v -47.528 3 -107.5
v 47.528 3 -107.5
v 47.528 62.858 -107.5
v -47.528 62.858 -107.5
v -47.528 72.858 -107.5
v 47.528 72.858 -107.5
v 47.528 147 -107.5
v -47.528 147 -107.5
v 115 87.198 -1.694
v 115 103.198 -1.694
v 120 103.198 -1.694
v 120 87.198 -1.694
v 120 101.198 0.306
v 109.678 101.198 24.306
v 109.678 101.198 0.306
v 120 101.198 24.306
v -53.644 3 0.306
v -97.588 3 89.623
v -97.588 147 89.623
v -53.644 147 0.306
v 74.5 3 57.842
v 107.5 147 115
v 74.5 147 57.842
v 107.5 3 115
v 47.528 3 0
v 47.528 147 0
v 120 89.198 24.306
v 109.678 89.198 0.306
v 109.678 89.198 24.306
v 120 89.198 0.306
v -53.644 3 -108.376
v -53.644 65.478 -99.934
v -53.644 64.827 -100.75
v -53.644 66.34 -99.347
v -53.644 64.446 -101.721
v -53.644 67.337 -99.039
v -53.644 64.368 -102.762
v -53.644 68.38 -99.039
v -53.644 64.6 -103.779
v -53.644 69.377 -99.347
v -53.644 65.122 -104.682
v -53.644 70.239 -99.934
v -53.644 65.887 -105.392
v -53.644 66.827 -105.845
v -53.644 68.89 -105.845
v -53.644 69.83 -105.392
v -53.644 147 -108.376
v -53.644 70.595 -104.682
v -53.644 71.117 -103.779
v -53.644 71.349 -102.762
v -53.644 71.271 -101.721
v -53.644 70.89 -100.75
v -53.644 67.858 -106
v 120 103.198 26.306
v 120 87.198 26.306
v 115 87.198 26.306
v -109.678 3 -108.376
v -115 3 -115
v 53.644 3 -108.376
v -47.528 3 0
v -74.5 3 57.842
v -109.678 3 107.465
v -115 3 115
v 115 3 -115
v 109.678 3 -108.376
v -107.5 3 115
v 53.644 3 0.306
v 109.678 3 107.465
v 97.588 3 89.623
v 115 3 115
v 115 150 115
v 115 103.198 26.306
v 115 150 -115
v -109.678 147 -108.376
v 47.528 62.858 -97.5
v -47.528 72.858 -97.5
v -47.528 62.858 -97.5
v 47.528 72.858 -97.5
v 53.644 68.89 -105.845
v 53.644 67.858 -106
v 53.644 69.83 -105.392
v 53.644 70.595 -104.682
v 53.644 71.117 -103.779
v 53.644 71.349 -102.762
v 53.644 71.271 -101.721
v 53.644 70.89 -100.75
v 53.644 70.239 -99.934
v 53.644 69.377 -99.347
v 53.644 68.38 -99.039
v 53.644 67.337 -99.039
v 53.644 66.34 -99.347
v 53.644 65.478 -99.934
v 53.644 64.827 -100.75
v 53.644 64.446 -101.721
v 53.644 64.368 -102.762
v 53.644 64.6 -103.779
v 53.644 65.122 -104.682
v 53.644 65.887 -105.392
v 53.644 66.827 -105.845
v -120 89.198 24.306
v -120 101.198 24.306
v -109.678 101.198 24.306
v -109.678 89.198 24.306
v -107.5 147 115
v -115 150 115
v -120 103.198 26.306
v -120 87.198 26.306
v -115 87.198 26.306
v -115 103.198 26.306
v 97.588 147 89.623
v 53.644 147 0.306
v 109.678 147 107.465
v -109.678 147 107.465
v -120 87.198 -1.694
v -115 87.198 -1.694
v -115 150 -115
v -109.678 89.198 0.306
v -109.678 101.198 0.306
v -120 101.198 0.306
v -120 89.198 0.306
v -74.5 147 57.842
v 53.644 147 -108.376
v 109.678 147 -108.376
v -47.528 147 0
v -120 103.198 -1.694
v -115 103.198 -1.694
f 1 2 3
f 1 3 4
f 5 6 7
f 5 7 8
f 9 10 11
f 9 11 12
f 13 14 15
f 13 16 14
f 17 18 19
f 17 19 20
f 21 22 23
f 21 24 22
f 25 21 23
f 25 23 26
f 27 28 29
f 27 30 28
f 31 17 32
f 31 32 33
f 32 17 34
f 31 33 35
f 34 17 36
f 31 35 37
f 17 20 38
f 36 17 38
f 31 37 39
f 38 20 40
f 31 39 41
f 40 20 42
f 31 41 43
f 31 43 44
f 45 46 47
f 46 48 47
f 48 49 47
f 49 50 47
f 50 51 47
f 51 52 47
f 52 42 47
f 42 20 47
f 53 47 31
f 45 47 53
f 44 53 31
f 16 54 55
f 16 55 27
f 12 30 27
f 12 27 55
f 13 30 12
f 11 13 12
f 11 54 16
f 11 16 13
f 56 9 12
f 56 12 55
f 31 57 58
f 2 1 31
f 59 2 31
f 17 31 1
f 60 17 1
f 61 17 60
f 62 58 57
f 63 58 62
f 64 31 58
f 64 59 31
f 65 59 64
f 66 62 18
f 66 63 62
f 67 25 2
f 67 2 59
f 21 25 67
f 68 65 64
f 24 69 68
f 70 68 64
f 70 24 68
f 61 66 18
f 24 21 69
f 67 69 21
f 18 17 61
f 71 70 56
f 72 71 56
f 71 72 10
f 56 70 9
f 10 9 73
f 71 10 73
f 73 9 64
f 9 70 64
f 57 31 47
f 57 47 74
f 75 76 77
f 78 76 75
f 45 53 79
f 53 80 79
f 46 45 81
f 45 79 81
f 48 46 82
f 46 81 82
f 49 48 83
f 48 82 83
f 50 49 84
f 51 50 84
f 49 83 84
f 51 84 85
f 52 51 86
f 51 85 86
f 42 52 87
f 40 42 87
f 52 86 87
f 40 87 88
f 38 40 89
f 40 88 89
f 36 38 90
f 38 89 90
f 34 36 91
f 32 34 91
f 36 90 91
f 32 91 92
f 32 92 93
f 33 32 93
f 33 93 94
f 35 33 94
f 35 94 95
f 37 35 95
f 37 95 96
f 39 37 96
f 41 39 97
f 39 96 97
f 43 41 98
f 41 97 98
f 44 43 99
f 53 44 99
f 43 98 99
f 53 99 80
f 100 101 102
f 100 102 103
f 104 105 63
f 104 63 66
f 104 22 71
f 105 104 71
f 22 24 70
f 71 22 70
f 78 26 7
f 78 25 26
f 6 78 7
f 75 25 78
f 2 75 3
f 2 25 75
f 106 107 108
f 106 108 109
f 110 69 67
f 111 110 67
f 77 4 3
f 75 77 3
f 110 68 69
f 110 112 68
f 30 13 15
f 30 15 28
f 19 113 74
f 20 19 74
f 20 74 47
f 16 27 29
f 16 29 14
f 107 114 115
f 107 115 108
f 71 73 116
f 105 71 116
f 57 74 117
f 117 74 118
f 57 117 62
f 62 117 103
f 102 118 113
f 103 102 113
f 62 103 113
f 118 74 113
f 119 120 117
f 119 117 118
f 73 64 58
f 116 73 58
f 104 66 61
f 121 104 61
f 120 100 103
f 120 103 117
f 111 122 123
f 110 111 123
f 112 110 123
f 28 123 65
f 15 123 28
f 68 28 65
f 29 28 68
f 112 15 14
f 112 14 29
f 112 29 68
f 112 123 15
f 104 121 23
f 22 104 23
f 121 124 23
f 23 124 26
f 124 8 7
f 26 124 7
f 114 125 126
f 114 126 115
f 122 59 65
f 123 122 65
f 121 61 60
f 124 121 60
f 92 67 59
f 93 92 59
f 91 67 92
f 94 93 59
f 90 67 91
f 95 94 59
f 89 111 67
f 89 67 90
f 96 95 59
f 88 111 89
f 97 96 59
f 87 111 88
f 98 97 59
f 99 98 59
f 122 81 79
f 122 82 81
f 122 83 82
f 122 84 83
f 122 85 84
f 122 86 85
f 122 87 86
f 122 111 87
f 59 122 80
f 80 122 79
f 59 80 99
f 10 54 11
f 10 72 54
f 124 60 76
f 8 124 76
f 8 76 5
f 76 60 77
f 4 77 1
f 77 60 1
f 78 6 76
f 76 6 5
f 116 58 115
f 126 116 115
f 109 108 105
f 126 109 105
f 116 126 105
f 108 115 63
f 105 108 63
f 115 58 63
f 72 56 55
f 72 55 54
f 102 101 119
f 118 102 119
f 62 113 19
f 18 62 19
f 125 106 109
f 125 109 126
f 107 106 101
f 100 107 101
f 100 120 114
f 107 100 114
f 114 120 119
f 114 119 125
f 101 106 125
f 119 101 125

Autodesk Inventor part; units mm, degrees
ref_plane "YZ Plane" through (0, 0, 0) normal (1, 0, 0) x (0, 1, 0)
ref_plane "XZ Plane" through (0, 0, 0) normal (0, 1, 0) x (-1, 0, 0)
ref_plane "XY Plane" through (0, 0, 0) normal (0, 0, 1) x (1, 0, 0)
sketch "Эскиз1" plane through (0, 0, 0) normal (0, 1, 0) x (-1, 0, 0)
  line L0 (-115, -115) -> (115, -115)
  line L1 (115, -115) -> (115, 115)
  line L2 (-115, 115) -> (-115, -115)
  line L3 (-115, -115) -> (115, 115) construction
  line L4 (115, -115) -> (-115, 115) construction
  line L5 (-107.5, -107.5) -> (107.5, -107.5)
  line L6 (107.5, -107.5) -> (107.5, 107.5)
  line L7 (-107.5, 107.5) -> (-107.5, -107.5)
  line L8 (-107.5, -107.5) -> (107.5, 107.5) construction
  line L9 (107.5, -107.5) -> (-107.5, 107.5) construction
  line L10 (107.5, 107.5) -> (107.5, 115)
  line L11 (-107.5, 107.5) -> (-107.5, 115)
  line L12 (115, 115) -> (107.5, 115)
  line L13 (-107.5, 115) -> (-115, 115)
  line L14 (107.5, 115) -> (74.5, 57.8423)
  line L15 (107.5, 115) -> (173.5, 115) construction
  line L16 (74.5, 57.8423) -> (47.5277, 0)
  line L17 (74.5, 57.8423) -> (138.3219, 57.8423) construction
  line L18 (47.5277, 0) -> (47.5277, -107.5)
  line L19 (-107.5, 115) -> (-74.5, 57.8423)
  line L20 (-107.5, 115) -> (-41.5, 115) construction
  line L21 (-74.5, 57.8423) -> (-47.5277, 0)
  line L22 (-74.5, 57.8423) -> (-10.6781, 57.8423) construction
  line L23 (-47.5277, 0) -> (-47.5277, -107.5)
  point P0 (0, 0)
  dimension "d0" = 230
  dimension "d1" = 230
  dimension "d4" = 66
  dimension "d5" = 120
  dimension "d6" = 115
  dimension "d7" = 66
  dimension "d8" = 60
  dimension "d9" = 65
extrude "Выдавливание1" add sketch "Эскиз1" along normal blind 150
sketch "Эскиз2" plane through (0, 150, 0) normal (0, 1, 0) x (1, 0, 0)
  line L0 (97.5879, -89.6233) -> (53.6439, -0.306)
  line L1 (53.6439, -0.306) -> (53.6439, 108.3759)
  line L2 (53.6439, 108.3759) -> (109.6776, 108.3759)
  line L3 (109.6776, 108.3759) -> (109.6776, -107.4647)
  line L4 (109.6776, -107.4647) -> (97.5879, -89.6233)
  line L5 (0, -179.4064) -> (0, 240.0482)
  line L6 (-97.5879, -89.6233) -> (-53.6439, -0.306)
  line L7 (-53.6439, -0.306) -> (-53.6439, 108.3759)
  line L8 (-53.6439, 108.3759) -> (-109.6776, 108.3759)
  line L9 (-109.6776, 108.3759) -> (-109.6776, -107.4647)
  line L10 (-109.6776, -107.4647) -> (-97.5879, -89.6233)
  point P0 (0, 0)
extrude "Выдавливание2" cut sketch "Эскиз2" against normal blind 135161
sketch "Эскиз3" plane through (0, 150, 0) normal (0, 1, 0) x (1, 0, 0)
  line L0 (-107.5, -115) -> (-115, -115) projected
  line L1 (115, 115) -> (-115, 115)
  line L2 (-115, 115) -> (-115, -115)
  line L3 (-115, -115) -> (115, -115)
  line L4 (115, -115) -> (115, 115)
  line L5 (115, 115) -> (-115, -115) construction
  line L6 (-115, 115) -> (115, -115) construction
  point P0 (0, 0)
extrude "Выдавливание3" add sketch "Эскиз3" against normal blind 3
sketch "Эскиз4" plane through (0, 0, 0) normal (0, -1, 0) x (1, 0, 0)
  line L0 (-115, -115) -> (115, -115) projected
  line L1 (115, 115) -> (-115, 115)
  line L2 (-115, 115) -> (-115, -115)
  line L3 (-115, -115) -> (115, -115)
  line L4 (115, -115) -> (115, 115)
  line L5 (115, 115) -> (-115, -115) construction
  line L6 (-115, 115) -> (115, -115) construction
  point P0 (0, 0)
  dimension "d16" = 230
  dimension "d17" = 230
extrude "Выдавливание4" cut sketch "Эскиз4" against normal blind 3
sketch "Эскиз5" plane through (-47.5277, 147, -107.5) normal (0, 0, 1) x (1, 0, 0)
  line L0 (95.0554, -144) -> (95.0554, 0) projected
  line L1 (-0.0319, -84.1415) -> (95.0554, -84.1415)
  line L2 (95.0554, -84.1415) -> (95.0554, -74.1415)
  line L3 (95.0554, -74.1415) -> (-0.0319, -74.1415)
  line L4 (-0.0319, -74.1415) -> (-0.0319, -84.1415)
  point P0 (47.5277, -147)
  dimension "d20" = 10
extrude "Выдавливание5" add sketch "Эскиз5" along normal blind 10
sketch "Эскиз6" plane through (53.6439, 147, 0.306) normal (1, 0, 0) x (0, 0, -1)
  line L0 (107.806, -74.1415) -> (97.806, -74.1415) projected
  line L1 (97.806, -74.1415) -> (97.806, -84.1415) projected
  line L2 (97.806, -84.1415) -> (107.806, -84.1415) projected
  line L3 (107.806, -144) -> (107.806, -84.1415) projected
  line L4 (107.806, -144) -> (0.306, -144) projected
  line L5 (0.306, -144) -> (0.306, 0) projected
  line L6 (0.306, 0) -> (107.806, 0) projected
  line L7 (107.806, -74.1415) -> (107.806, 0) projected
  circle A0 centre (102.806, -79.1415) radius 3.5
  point P0 (0.306, -147)
  dimension "d23" = 7
extrude "Выдавливание6" cut sketch "Эскиз6" against normal blind 113.25 contours A0
sketch "Эскиз7" plane through (115, 150, 115) normal (1, 0, 0) x (0, 0, -1)
  line L0 (114.694, -3) -> (114.694, -147) projected
  line L1 (114.694, -60.802) -> (90.694, -60.802)
  line L2 (90.694, -60.802) -> (90.694, -48.802)
  line L3 (90.694, -48.802) -> (114.694, -48.802)
  line L4 (114.694, -48.802) -> (114.694, -60.802)
  line L5 (116.694, -62.802) -> (88.694, -62.802)
  line L6 (88.694, -62.802) -> (88.694, -46.802)
  line L7 (88.694, -46.802) -> (116.694, -46.802)
  line L8 (116.694, -46.802) -> (116.694, -62.802)
  line L9 (116.694, -62.802) -> (88.694, -46.802) construction
  line L10 (88.694, -62.802) -> (116.694, -46.802) construction
  point P0 (115, -150)
  point P1 (102.694, -54.802)
  point P2 (114.694, -48.802)
  dimension "d26" = 24
  dimension "d27" = 12
  dimension "d28" = 28
  dimension "d29" = 16
extrude "Выдавливание7" add sketch "Эскиз7" along normal blind 5 contours L0 L7 L8 L5 | L3 L2 L1 L0 L5 L6 L7
extrude "Выдавливание8" cut sketch "Эскиз7" against normal blind 44.75 contours L0 L1 L2 L3
pattern_linear "Прямоуг.массив1" count 2 spacing 235 along (-1, 0, 0) of "Выдавливание7"
sketch "Эскиз8" plane through (-115, 89.198, 0.306) normal (-1, 0, 0) x (0, 0, 1)
  line L0 (24, 12) -> (24, 0) projected
  line L1 (24, 12) -> (0, 12) projected
  line L2 (24, 0) -> (0, 0)
  line L3 (0, 0) -> (0, 12)
  line L4 (0, 12) -> (24, 12)
  line L5 (24, 12) -> (24, 0)
  point P0 (-0.306, -89.198)
extrude "Выдавливание9" cut sketch "Эскиз8" against normal blind 18
properties part number "qzawsxedcfvgbhnjmk,l."
